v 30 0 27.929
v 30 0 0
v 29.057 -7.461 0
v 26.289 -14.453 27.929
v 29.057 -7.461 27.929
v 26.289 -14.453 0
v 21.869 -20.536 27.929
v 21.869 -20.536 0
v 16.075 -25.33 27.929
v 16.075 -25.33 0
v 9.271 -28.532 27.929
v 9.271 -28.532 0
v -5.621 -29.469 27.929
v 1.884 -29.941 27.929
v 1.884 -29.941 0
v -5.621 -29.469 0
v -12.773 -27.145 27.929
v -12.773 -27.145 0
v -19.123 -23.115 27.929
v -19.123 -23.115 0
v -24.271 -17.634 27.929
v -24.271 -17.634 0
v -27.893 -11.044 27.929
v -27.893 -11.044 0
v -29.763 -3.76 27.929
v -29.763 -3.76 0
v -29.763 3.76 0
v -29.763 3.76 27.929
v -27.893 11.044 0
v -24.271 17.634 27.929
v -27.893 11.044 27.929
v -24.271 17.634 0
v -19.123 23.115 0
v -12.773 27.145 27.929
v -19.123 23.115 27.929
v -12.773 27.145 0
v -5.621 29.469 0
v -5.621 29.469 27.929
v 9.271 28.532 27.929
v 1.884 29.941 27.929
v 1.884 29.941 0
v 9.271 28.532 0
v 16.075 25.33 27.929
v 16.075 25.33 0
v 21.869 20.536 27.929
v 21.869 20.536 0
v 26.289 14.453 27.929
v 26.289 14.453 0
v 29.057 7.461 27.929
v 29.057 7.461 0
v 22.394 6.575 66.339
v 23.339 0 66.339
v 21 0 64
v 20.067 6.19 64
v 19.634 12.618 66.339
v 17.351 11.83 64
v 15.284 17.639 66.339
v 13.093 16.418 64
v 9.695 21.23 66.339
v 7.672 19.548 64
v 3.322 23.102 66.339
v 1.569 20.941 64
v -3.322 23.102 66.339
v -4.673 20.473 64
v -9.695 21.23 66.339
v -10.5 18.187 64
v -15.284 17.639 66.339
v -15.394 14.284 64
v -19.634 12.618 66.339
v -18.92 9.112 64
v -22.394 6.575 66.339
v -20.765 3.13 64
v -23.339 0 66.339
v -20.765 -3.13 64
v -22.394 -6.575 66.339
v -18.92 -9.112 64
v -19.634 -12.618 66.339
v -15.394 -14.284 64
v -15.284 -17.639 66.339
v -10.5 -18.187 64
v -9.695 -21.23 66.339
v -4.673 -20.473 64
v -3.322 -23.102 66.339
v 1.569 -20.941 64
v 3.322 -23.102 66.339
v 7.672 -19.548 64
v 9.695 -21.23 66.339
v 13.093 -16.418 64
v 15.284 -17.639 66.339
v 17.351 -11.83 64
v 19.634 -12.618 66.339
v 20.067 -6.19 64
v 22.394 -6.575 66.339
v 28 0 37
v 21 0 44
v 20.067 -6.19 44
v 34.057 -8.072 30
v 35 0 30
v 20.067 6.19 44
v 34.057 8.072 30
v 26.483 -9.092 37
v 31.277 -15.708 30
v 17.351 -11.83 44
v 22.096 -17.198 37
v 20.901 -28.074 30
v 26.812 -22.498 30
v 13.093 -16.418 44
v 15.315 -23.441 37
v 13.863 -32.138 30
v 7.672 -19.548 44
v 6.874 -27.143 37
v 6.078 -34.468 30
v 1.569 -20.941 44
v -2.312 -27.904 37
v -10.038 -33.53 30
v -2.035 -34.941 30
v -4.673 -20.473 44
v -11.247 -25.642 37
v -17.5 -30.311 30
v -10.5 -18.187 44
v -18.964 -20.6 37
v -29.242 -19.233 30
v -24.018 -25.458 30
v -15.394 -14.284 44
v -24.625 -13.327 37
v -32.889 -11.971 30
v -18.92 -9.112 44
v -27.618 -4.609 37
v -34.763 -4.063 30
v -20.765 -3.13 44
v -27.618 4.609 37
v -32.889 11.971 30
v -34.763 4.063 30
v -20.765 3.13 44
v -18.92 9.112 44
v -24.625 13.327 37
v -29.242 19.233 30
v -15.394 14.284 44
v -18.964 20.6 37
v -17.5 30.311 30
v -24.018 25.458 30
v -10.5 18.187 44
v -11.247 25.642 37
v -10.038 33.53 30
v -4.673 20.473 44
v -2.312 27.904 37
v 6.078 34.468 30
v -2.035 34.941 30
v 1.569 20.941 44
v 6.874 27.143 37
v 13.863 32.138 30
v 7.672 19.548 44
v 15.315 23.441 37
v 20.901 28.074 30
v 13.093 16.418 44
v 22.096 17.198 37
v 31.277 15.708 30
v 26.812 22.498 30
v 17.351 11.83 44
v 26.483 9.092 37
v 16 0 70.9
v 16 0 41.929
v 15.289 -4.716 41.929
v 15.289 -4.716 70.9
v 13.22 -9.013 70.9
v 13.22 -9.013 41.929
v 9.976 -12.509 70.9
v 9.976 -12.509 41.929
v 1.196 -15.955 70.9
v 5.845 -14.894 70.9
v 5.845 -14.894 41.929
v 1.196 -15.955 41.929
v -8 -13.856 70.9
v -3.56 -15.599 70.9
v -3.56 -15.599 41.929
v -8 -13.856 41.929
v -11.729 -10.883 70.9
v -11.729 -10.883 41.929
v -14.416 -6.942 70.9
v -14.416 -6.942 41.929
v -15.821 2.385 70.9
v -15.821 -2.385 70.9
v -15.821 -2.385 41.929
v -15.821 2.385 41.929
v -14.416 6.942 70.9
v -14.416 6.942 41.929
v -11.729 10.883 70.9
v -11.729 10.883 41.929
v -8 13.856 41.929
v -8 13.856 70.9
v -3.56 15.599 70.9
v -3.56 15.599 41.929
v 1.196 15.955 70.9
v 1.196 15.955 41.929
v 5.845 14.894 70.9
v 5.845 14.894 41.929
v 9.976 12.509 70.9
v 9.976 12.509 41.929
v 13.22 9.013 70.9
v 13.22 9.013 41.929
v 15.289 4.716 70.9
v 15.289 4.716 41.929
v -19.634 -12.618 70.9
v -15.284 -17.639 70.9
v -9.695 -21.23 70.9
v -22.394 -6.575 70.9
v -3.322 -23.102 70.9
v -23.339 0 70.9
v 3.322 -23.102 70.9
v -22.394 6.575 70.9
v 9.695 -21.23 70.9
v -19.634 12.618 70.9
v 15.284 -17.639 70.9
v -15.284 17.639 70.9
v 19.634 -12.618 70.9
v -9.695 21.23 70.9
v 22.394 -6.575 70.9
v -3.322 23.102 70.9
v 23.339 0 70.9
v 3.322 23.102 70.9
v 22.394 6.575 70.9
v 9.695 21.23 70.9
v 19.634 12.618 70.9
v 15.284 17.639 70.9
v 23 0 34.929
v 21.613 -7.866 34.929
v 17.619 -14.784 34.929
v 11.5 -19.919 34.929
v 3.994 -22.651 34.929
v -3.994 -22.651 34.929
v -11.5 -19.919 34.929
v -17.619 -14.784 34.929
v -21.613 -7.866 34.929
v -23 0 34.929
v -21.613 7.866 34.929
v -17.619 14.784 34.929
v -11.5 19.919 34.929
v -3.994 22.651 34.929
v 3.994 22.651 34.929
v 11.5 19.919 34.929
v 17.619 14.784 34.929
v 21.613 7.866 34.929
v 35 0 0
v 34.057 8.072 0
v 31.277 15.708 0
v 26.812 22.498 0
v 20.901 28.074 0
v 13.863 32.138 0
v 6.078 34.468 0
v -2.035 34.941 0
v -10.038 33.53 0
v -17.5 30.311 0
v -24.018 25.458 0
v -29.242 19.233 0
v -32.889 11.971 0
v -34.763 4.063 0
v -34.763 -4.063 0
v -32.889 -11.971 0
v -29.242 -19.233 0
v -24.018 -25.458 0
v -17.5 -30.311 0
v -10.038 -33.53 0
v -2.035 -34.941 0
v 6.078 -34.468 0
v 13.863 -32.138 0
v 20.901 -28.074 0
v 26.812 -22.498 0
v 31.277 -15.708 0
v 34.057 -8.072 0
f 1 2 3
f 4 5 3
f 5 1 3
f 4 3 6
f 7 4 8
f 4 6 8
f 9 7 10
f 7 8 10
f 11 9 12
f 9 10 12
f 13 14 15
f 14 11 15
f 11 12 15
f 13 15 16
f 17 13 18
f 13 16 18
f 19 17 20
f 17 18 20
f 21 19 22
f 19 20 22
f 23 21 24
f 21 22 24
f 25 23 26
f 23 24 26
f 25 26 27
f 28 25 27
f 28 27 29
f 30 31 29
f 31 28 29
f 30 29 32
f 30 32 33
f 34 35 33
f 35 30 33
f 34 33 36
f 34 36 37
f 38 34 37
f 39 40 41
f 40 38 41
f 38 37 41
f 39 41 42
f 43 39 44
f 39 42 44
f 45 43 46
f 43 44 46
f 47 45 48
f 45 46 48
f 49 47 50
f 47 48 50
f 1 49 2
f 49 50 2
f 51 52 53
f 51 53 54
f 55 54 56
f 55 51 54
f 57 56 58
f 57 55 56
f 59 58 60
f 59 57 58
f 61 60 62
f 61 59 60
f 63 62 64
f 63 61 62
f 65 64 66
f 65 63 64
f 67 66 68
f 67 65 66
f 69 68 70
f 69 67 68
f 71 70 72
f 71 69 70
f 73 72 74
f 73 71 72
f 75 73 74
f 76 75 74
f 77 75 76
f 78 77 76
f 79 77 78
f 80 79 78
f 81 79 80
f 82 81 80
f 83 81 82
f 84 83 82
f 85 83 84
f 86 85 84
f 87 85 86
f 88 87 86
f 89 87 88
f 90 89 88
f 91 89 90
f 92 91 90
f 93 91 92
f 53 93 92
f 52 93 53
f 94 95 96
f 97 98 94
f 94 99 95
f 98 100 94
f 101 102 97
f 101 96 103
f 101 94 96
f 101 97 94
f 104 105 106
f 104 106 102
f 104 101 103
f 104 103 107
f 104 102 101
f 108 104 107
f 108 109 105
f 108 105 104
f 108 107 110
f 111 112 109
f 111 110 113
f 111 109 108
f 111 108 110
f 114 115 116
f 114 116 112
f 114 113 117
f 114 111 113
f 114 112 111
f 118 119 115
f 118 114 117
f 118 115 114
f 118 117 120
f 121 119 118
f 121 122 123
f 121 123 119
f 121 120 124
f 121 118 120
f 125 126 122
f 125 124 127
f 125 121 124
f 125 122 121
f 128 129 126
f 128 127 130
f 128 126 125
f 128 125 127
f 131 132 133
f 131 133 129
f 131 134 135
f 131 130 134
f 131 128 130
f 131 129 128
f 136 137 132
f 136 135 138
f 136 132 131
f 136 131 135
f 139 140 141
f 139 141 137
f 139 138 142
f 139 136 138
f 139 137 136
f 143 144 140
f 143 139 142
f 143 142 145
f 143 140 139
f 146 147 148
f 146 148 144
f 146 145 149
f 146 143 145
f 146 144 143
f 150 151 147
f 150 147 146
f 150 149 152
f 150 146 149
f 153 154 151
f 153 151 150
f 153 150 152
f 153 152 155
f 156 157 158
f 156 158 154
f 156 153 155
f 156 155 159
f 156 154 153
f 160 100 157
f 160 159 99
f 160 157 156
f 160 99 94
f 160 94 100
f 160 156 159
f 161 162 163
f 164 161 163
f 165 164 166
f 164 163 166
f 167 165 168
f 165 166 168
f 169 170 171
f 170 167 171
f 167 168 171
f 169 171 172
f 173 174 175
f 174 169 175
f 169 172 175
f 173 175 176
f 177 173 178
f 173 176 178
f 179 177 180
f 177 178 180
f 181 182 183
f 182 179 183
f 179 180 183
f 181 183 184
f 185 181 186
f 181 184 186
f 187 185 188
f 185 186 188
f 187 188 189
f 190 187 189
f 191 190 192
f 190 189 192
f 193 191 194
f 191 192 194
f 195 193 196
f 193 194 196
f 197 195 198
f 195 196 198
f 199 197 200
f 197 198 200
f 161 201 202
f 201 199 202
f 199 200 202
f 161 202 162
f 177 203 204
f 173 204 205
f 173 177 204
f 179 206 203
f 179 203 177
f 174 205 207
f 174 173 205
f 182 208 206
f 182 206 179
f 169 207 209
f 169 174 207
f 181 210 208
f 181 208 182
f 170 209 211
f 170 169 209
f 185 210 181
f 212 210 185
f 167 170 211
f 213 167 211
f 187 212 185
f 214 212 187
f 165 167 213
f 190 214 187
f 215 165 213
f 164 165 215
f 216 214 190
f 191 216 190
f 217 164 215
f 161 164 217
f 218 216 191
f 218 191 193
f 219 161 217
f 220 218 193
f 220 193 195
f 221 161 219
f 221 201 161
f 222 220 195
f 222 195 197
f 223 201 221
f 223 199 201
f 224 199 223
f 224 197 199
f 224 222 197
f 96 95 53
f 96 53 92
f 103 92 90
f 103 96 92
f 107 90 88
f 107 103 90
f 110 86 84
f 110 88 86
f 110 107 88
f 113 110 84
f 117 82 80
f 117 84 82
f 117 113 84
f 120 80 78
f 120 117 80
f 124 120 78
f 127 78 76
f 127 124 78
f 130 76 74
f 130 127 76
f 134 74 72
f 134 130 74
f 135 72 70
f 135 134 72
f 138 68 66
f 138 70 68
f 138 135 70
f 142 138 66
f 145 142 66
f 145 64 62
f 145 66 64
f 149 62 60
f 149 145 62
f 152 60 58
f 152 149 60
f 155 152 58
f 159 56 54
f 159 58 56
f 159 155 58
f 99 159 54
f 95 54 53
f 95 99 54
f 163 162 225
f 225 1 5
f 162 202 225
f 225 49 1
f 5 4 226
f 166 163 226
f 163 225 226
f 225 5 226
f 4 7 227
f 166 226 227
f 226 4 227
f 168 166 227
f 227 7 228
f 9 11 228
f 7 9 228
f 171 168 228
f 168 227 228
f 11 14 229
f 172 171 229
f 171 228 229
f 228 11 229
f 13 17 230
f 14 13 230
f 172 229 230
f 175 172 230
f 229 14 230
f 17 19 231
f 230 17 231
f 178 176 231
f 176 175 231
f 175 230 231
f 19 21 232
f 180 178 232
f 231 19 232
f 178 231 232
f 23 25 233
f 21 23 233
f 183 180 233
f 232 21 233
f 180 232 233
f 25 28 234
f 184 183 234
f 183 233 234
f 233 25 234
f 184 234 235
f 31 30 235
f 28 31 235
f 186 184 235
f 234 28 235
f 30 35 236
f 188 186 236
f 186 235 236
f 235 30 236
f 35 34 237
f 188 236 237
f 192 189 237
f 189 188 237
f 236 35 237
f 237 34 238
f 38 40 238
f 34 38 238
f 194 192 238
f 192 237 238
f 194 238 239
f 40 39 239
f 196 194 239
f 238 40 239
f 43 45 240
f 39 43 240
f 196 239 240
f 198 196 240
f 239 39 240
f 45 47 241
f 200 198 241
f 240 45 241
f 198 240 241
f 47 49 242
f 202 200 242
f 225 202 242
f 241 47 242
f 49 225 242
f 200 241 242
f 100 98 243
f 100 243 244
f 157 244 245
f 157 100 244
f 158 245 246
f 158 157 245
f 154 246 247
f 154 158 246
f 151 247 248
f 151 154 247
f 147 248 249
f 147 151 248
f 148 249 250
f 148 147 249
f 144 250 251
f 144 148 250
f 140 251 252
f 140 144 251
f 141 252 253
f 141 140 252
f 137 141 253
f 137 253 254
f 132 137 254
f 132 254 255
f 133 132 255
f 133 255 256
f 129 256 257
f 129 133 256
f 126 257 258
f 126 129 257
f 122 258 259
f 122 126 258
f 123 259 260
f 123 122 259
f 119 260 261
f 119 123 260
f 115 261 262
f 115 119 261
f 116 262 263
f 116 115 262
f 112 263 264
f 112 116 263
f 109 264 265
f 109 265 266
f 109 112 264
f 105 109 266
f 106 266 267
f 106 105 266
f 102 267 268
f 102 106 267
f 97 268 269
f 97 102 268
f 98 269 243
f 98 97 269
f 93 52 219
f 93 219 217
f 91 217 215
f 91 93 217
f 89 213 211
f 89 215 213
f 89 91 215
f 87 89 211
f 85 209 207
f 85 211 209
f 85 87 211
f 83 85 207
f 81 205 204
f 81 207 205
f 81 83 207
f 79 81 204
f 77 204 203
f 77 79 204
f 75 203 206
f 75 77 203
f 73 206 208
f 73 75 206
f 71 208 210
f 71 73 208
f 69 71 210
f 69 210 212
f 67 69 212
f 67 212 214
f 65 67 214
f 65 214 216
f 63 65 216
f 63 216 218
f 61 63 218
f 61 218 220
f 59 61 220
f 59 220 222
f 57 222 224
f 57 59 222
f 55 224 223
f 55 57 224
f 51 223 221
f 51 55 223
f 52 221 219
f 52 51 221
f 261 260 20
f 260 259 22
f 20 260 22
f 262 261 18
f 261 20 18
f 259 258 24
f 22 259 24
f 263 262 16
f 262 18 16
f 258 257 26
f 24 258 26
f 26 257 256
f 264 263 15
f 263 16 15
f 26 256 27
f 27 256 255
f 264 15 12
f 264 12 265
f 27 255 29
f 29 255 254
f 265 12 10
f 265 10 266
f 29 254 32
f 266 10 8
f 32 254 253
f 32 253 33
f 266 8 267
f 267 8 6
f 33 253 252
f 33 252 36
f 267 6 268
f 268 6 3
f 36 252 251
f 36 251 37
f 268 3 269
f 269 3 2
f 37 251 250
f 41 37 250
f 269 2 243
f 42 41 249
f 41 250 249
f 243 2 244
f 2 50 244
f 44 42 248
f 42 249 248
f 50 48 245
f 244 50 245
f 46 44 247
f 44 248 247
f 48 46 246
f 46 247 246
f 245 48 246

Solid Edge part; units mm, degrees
sketch "Sketch1" plane through (0, 0, 0) normal (0, -1, 0) x (1, 0, 0)
  line L0 (23.3391, 70.9) -> (23.3391, 66.3391)
  line L1 (23.3391, 66.3391) -> (21, 64)
  line L2 (21, 64) -> (21, 44)
  line L3 (35, 30) -> (21, 44)
  line L4 (35, 0) -> (35, 30)
  line L5 (30, 0) -> (35, 0)
  line L6 (30, 27.9289) -> (30, 0)
  line L7 (16, 41.9289) -> (30, 27.9289)
  line L8 (16, 70.9) -> (16, 41.9289)
  line L9 (16, 70.9) -> (23.3391, 70.9)
revolve "RevolvedProtrusion1" add sketch "Sketch1" angle 360 about axis through (0, 0, 0) along (0, 0, 1)
